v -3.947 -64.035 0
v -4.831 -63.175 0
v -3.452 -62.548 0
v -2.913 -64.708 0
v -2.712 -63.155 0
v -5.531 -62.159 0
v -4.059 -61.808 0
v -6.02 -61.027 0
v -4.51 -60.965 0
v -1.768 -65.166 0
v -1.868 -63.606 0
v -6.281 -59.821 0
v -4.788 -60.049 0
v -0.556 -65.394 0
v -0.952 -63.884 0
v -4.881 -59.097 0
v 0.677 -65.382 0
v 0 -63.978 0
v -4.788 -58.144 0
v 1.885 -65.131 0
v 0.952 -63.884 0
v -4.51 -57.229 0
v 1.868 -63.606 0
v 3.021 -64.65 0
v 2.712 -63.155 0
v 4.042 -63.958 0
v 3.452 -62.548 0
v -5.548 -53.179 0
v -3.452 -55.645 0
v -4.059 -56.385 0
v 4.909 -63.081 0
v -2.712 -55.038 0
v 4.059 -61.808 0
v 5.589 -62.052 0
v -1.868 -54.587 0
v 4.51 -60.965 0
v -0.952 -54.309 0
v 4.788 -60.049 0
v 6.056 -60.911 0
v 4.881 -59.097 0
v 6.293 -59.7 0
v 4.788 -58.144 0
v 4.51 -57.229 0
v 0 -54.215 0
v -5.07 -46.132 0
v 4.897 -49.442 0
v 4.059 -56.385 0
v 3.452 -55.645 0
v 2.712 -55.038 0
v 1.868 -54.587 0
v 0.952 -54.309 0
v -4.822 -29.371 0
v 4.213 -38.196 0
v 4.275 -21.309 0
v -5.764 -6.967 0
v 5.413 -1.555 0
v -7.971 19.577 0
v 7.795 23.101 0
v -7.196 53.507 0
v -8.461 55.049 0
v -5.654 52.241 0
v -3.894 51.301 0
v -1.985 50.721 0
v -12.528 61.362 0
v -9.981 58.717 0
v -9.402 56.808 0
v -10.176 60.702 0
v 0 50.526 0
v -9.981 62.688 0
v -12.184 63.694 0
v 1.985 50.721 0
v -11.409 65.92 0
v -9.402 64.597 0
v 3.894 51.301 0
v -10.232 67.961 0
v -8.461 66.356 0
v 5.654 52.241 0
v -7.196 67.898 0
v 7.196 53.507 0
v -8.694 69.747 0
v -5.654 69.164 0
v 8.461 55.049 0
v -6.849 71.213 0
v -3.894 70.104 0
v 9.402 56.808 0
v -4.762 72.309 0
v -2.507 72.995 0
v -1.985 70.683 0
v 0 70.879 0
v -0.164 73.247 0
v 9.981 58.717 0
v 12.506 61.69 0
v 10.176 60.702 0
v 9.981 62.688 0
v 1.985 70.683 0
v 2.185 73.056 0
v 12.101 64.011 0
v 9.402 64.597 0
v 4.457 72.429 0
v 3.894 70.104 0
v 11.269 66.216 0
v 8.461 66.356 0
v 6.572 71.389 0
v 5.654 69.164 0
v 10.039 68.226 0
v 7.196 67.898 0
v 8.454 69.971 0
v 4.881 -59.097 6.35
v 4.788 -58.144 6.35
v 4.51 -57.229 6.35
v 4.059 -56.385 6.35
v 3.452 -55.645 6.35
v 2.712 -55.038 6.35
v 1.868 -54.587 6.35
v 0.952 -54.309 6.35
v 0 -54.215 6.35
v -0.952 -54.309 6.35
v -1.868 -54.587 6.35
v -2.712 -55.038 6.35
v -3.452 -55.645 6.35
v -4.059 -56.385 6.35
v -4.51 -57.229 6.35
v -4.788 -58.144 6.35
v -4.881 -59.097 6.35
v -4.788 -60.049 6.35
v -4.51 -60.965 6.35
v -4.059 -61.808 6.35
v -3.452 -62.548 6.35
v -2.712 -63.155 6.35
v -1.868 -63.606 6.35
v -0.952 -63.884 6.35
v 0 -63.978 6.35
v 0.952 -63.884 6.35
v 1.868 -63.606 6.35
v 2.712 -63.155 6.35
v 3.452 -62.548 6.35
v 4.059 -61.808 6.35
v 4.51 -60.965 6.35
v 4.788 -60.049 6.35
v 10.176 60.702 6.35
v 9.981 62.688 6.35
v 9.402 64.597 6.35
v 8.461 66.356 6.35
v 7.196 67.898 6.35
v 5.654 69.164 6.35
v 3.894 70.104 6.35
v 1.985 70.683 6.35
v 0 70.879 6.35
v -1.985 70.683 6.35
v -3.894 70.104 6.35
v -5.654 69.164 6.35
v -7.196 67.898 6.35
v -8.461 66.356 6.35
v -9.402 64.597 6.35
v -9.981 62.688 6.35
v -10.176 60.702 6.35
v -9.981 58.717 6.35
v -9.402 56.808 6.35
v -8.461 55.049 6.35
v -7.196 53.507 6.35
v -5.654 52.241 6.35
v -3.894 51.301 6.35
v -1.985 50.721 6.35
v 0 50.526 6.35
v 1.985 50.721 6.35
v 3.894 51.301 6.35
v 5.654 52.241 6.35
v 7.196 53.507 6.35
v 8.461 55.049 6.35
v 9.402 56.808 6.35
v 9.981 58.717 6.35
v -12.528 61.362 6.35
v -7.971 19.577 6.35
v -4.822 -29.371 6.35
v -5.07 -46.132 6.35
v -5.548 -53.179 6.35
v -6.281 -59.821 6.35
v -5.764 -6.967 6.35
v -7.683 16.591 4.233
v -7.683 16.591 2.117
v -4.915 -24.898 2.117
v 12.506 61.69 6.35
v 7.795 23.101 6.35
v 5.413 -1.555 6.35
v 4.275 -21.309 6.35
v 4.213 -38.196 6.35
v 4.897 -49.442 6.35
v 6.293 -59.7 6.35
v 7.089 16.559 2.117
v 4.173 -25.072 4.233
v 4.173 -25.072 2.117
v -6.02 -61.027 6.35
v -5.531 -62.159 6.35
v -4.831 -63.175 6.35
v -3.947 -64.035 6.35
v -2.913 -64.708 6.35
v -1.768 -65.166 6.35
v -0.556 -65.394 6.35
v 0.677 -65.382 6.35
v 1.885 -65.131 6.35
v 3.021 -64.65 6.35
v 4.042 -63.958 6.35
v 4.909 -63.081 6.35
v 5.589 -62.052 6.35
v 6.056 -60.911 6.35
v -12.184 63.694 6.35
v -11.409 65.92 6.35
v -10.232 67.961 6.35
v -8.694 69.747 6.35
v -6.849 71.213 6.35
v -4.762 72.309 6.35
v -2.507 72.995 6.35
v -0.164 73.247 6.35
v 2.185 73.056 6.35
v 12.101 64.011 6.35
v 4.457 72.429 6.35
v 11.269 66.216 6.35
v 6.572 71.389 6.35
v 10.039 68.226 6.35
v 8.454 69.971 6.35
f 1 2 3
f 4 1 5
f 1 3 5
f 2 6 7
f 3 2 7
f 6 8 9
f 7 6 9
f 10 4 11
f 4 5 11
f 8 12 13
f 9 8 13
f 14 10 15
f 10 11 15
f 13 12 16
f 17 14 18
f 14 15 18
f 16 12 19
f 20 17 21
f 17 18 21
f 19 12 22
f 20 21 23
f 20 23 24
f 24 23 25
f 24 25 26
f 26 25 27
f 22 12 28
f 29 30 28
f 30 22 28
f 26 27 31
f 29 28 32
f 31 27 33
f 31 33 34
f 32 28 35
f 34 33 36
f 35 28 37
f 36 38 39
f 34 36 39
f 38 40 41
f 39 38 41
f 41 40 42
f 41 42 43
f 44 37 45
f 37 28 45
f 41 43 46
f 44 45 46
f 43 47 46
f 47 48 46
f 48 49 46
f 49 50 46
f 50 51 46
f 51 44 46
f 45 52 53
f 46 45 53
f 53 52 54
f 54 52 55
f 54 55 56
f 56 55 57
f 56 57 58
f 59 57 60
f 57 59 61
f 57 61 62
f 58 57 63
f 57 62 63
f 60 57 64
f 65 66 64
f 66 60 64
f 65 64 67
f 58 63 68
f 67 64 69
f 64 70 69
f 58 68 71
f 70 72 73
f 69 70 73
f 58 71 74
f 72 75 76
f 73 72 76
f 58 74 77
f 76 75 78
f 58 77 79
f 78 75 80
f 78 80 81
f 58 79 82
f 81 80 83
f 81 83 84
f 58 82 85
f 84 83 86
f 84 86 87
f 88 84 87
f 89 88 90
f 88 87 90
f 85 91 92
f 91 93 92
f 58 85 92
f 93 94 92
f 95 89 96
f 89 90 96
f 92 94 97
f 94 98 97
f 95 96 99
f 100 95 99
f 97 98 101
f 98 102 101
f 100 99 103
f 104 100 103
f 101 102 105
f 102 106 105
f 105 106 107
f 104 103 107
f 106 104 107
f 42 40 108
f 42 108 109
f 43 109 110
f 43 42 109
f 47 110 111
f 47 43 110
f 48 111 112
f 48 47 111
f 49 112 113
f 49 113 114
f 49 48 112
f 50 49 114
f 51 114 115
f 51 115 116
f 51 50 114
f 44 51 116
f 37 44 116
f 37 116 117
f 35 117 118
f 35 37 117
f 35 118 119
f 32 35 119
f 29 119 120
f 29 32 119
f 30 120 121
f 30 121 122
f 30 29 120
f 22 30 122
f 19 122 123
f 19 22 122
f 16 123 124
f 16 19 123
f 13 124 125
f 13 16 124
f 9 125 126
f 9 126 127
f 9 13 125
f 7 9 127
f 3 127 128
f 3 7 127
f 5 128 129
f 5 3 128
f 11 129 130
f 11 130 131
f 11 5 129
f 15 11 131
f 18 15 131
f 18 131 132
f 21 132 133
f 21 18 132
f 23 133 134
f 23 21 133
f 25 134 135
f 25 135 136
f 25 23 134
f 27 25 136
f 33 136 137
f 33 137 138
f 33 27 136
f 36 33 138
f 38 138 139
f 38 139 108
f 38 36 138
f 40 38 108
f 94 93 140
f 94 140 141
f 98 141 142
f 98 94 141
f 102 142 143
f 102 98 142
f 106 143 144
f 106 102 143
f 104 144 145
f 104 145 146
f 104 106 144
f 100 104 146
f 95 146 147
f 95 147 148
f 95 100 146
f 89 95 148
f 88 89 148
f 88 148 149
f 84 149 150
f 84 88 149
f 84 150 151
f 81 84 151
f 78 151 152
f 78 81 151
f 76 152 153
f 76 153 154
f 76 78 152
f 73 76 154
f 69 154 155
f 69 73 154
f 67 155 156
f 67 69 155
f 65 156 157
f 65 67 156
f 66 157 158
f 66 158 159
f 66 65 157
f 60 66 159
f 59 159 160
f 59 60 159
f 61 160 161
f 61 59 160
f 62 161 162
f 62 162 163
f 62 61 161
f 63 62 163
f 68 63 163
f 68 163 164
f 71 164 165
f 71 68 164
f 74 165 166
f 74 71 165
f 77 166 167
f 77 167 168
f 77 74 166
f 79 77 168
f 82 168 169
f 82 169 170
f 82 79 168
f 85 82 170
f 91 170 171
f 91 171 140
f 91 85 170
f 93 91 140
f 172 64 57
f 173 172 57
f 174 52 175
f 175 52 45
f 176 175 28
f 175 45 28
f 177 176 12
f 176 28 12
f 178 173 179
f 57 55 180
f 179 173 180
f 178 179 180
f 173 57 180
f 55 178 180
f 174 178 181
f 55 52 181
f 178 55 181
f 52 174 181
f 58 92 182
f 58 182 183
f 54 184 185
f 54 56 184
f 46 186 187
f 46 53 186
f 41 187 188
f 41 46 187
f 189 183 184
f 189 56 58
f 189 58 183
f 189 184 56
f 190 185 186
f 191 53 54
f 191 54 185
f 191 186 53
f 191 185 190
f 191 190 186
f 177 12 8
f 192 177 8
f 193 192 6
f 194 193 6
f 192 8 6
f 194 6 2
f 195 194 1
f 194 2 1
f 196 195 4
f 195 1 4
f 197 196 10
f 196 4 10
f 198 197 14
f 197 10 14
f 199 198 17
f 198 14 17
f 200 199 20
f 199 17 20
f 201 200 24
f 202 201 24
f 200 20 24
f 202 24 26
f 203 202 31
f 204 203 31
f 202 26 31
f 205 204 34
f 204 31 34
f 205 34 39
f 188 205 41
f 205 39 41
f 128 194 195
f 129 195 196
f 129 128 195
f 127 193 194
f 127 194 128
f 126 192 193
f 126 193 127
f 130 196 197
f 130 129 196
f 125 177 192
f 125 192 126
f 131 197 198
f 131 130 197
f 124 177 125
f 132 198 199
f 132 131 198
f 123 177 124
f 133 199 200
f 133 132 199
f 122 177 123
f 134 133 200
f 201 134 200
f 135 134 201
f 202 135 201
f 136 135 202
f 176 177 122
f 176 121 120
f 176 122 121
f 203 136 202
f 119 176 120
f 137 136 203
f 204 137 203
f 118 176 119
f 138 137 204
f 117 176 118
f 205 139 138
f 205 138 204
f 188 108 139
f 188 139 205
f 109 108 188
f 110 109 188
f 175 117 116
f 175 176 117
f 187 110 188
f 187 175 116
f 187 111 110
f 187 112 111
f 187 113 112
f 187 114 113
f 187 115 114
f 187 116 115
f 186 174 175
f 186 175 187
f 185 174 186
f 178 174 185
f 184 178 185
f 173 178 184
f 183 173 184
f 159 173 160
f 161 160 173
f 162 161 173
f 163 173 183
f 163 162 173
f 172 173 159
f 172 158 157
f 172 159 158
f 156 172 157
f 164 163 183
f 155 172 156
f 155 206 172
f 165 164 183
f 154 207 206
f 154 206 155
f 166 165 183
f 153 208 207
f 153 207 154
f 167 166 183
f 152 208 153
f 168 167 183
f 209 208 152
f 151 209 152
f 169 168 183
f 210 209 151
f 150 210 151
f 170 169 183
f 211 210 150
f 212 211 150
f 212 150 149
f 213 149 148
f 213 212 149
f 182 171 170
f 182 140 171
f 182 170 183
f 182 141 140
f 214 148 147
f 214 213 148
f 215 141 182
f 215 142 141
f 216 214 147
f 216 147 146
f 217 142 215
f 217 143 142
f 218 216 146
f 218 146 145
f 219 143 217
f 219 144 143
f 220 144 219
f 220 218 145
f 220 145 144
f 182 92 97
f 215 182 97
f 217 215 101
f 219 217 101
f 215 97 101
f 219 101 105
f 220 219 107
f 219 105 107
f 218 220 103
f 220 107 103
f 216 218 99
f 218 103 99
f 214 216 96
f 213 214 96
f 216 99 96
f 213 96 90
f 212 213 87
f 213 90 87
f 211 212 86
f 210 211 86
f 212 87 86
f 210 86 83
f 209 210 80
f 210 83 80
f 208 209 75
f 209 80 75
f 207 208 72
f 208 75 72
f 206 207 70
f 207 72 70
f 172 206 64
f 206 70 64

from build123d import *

# Parameters (mm, degrees)
F0_R     = 4.8813139191
F0_R_2   = 10.1764917569
F1_DEPTH = 6.35


with BuildPart() as f1:
    # F0 (on Top) → F1 (new body)
    with BuildSketch(Plane.XY):
        with BuildLine():
            add(Edge.make_bspline(
                [(-12.5280236165, 61.3621314645), (-7.3308367109, 16.0433941021), (-2.1616382879, -29.2743790858), (-6.2805634765, -59.8213464213)],
                knots=[0, 0, 0, 0, 0.612325914, 0.612325914, 0.612325914, 0.612325914], degree=3))
            ThreePointArc((-6.2805634765, -59.8213464213), (0.0609906573, -65.418488491), (6.2933783491, -59.7000401142))
            add(Edge.make_bspline(
                [(12.5064774979, 61.6896377928), (6.6850781441, 15.9770144044), (0.8078775975, -29.741100788), (6.2933783491, -59.7000401142)],
                knots=[0, 0, 0, 0, 0.6137866635, 0.6137866635, 0.6137866635, 0.6137866635], degree=3))
            ThreePointArc((12.5064774979, 61.6896377928), (-0.1641071527, 73.2467040487), (-12.5280236165, 61.3621314645))
        make_face()
        with Locations((0, -59.0965338051)):
            Circle(F0_R, mode=Mode.SUBTRACT)
        with Locations((0, 60.7023946941)):
            Circle(F0_R_2, mode=Mode.SUBTRACT)
    extrude(amount=F1_DEPTH)


solid = f1.part
